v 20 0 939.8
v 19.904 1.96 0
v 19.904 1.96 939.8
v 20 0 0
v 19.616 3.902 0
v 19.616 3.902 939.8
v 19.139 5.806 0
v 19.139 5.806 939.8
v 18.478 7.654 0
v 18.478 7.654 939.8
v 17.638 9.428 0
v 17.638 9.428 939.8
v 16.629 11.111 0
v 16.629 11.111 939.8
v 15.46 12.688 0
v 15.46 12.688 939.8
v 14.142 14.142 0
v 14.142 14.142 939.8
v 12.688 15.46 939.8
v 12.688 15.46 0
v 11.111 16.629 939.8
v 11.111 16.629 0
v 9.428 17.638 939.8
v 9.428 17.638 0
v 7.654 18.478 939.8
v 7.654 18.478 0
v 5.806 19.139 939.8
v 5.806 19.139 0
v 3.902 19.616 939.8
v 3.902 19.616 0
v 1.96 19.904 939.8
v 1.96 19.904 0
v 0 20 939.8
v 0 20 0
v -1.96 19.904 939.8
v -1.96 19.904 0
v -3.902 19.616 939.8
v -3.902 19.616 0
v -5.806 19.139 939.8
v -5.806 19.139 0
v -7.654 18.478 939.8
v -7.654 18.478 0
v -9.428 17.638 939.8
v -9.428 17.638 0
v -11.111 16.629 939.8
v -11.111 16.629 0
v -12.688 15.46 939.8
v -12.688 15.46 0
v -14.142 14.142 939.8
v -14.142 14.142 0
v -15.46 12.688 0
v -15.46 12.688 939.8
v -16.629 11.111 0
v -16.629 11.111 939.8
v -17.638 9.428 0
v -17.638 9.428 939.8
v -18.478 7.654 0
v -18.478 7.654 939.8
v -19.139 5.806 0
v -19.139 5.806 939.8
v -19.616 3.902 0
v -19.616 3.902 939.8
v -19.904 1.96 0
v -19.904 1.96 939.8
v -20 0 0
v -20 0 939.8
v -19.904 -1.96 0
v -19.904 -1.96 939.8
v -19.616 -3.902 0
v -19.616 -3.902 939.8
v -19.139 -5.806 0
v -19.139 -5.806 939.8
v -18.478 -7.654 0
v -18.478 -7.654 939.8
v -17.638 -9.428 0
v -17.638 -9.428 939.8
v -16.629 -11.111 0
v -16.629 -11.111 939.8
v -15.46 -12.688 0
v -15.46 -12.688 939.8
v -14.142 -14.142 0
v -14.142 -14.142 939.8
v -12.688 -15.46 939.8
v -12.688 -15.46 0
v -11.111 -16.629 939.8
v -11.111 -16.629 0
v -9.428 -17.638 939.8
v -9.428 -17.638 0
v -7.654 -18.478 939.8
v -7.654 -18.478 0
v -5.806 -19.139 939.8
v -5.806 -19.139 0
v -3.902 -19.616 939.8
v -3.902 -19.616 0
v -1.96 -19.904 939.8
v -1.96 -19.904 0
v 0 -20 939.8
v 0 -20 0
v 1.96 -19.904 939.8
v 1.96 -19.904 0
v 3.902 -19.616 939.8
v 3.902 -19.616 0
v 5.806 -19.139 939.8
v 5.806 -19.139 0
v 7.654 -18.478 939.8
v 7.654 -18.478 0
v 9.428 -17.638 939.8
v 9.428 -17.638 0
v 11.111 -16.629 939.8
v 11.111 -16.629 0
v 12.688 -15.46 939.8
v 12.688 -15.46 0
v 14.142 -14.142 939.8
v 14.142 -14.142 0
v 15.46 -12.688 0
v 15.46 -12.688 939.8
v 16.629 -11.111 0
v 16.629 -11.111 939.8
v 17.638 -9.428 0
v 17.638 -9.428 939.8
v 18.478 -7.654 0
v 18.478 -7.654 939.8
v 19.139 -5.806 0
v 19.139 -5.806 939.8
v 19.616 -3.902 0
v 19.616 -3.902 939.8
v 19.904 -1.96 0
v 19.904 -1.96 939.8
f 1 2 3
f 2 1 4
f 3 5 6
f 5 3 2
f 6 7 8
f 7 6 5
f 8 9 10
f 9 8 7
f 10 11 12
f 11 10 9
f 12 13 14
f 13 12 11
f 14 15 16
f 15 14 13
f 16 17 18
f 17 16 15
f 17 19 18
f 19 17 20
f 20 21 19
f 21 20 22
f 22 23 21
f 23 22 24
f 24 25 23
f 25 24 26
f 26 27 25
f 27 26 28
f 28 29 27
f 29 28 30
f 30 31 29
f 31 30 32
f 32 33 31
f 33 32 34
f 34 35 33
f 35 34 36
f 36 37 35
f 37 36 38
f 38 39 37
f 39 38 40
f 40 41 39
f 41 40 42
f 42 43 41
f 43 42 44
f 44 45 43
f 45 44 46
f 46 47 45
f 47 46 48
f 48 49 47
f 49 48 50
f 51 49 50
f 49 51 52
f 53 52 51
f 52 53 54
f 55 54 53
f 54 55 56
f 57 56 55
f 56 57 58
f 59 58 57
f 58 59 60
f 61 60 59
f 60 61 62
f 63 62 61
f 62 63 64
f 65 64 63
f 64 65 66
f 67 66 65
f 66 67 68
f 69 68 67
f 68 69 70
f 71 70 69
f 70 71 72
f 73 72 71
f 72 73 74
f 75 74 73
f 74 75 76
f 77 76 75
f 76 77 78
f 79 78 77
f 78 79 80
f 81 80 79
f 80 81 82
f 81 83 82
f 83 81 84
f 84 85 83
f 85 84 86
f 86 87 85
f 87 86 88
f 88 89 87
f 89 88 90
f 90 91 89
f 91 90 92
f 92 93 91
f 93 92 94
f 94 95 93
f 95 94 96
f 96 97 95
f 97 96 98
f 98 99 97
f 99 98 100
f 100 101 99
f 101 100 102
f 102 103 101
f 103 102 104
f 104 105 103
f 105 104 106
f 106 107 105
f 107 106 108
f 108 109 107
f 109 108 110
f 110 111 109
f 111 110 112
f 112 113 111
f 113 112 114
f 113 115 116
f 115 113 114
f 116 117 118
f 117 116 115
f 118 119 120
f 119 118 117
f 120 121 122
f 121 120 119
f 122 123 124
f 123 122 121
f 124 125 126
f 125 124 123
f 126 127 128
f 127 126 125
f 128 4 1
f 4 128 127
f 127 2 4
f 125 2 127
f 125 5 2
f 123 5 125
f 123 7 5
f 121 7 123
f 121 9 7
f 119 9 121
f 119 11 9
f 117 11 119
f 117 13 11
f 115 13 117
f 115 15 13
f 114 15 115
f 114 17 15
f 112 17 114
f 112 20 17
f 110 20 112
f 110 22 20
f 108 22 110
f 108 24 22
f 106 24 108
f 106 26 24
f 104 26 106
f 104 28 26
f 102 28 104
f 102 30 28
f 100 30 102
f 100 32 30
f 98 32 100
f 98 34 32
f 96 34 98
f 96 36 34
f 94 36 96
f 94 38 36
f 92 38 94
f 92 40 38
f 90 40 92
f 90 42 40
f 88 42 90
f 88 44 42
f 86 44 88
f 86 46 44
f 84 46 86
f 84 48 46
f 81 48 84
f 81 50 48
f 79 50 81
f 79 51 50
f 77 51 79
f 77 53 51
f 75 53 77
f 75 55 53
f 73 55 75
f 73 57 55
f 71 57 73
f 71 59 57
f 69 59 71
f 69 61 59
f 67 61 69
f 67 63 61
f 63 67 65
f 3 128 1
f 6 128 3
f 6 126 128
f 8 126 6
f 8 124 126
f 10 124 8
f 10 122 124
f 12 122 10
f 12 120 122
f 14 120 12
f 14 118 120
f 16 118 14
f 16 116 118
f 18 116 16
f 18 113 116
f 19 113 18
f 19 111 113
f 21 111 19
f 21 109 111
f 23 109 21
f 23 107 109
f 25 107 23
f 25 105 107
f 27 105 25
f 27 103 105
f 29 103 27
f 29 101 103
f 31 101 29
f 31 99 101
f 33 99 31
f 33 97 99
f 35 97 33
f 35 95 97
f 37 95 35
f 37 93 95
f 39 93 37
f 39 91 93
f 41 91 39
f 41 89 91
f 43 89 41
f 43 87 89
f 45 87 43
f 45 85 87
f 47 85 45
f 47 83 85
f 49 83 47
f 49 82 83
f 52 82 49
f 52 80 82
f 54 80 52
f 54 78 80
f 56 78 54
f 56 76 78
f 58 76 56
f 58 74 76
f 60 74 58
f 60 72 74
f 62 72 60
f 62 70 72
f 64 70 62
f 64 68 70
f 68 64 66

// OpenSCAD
$fn=64;

pole();

module pole() {
  h=939.8;
  cylinder(r=20,h=h);
}
